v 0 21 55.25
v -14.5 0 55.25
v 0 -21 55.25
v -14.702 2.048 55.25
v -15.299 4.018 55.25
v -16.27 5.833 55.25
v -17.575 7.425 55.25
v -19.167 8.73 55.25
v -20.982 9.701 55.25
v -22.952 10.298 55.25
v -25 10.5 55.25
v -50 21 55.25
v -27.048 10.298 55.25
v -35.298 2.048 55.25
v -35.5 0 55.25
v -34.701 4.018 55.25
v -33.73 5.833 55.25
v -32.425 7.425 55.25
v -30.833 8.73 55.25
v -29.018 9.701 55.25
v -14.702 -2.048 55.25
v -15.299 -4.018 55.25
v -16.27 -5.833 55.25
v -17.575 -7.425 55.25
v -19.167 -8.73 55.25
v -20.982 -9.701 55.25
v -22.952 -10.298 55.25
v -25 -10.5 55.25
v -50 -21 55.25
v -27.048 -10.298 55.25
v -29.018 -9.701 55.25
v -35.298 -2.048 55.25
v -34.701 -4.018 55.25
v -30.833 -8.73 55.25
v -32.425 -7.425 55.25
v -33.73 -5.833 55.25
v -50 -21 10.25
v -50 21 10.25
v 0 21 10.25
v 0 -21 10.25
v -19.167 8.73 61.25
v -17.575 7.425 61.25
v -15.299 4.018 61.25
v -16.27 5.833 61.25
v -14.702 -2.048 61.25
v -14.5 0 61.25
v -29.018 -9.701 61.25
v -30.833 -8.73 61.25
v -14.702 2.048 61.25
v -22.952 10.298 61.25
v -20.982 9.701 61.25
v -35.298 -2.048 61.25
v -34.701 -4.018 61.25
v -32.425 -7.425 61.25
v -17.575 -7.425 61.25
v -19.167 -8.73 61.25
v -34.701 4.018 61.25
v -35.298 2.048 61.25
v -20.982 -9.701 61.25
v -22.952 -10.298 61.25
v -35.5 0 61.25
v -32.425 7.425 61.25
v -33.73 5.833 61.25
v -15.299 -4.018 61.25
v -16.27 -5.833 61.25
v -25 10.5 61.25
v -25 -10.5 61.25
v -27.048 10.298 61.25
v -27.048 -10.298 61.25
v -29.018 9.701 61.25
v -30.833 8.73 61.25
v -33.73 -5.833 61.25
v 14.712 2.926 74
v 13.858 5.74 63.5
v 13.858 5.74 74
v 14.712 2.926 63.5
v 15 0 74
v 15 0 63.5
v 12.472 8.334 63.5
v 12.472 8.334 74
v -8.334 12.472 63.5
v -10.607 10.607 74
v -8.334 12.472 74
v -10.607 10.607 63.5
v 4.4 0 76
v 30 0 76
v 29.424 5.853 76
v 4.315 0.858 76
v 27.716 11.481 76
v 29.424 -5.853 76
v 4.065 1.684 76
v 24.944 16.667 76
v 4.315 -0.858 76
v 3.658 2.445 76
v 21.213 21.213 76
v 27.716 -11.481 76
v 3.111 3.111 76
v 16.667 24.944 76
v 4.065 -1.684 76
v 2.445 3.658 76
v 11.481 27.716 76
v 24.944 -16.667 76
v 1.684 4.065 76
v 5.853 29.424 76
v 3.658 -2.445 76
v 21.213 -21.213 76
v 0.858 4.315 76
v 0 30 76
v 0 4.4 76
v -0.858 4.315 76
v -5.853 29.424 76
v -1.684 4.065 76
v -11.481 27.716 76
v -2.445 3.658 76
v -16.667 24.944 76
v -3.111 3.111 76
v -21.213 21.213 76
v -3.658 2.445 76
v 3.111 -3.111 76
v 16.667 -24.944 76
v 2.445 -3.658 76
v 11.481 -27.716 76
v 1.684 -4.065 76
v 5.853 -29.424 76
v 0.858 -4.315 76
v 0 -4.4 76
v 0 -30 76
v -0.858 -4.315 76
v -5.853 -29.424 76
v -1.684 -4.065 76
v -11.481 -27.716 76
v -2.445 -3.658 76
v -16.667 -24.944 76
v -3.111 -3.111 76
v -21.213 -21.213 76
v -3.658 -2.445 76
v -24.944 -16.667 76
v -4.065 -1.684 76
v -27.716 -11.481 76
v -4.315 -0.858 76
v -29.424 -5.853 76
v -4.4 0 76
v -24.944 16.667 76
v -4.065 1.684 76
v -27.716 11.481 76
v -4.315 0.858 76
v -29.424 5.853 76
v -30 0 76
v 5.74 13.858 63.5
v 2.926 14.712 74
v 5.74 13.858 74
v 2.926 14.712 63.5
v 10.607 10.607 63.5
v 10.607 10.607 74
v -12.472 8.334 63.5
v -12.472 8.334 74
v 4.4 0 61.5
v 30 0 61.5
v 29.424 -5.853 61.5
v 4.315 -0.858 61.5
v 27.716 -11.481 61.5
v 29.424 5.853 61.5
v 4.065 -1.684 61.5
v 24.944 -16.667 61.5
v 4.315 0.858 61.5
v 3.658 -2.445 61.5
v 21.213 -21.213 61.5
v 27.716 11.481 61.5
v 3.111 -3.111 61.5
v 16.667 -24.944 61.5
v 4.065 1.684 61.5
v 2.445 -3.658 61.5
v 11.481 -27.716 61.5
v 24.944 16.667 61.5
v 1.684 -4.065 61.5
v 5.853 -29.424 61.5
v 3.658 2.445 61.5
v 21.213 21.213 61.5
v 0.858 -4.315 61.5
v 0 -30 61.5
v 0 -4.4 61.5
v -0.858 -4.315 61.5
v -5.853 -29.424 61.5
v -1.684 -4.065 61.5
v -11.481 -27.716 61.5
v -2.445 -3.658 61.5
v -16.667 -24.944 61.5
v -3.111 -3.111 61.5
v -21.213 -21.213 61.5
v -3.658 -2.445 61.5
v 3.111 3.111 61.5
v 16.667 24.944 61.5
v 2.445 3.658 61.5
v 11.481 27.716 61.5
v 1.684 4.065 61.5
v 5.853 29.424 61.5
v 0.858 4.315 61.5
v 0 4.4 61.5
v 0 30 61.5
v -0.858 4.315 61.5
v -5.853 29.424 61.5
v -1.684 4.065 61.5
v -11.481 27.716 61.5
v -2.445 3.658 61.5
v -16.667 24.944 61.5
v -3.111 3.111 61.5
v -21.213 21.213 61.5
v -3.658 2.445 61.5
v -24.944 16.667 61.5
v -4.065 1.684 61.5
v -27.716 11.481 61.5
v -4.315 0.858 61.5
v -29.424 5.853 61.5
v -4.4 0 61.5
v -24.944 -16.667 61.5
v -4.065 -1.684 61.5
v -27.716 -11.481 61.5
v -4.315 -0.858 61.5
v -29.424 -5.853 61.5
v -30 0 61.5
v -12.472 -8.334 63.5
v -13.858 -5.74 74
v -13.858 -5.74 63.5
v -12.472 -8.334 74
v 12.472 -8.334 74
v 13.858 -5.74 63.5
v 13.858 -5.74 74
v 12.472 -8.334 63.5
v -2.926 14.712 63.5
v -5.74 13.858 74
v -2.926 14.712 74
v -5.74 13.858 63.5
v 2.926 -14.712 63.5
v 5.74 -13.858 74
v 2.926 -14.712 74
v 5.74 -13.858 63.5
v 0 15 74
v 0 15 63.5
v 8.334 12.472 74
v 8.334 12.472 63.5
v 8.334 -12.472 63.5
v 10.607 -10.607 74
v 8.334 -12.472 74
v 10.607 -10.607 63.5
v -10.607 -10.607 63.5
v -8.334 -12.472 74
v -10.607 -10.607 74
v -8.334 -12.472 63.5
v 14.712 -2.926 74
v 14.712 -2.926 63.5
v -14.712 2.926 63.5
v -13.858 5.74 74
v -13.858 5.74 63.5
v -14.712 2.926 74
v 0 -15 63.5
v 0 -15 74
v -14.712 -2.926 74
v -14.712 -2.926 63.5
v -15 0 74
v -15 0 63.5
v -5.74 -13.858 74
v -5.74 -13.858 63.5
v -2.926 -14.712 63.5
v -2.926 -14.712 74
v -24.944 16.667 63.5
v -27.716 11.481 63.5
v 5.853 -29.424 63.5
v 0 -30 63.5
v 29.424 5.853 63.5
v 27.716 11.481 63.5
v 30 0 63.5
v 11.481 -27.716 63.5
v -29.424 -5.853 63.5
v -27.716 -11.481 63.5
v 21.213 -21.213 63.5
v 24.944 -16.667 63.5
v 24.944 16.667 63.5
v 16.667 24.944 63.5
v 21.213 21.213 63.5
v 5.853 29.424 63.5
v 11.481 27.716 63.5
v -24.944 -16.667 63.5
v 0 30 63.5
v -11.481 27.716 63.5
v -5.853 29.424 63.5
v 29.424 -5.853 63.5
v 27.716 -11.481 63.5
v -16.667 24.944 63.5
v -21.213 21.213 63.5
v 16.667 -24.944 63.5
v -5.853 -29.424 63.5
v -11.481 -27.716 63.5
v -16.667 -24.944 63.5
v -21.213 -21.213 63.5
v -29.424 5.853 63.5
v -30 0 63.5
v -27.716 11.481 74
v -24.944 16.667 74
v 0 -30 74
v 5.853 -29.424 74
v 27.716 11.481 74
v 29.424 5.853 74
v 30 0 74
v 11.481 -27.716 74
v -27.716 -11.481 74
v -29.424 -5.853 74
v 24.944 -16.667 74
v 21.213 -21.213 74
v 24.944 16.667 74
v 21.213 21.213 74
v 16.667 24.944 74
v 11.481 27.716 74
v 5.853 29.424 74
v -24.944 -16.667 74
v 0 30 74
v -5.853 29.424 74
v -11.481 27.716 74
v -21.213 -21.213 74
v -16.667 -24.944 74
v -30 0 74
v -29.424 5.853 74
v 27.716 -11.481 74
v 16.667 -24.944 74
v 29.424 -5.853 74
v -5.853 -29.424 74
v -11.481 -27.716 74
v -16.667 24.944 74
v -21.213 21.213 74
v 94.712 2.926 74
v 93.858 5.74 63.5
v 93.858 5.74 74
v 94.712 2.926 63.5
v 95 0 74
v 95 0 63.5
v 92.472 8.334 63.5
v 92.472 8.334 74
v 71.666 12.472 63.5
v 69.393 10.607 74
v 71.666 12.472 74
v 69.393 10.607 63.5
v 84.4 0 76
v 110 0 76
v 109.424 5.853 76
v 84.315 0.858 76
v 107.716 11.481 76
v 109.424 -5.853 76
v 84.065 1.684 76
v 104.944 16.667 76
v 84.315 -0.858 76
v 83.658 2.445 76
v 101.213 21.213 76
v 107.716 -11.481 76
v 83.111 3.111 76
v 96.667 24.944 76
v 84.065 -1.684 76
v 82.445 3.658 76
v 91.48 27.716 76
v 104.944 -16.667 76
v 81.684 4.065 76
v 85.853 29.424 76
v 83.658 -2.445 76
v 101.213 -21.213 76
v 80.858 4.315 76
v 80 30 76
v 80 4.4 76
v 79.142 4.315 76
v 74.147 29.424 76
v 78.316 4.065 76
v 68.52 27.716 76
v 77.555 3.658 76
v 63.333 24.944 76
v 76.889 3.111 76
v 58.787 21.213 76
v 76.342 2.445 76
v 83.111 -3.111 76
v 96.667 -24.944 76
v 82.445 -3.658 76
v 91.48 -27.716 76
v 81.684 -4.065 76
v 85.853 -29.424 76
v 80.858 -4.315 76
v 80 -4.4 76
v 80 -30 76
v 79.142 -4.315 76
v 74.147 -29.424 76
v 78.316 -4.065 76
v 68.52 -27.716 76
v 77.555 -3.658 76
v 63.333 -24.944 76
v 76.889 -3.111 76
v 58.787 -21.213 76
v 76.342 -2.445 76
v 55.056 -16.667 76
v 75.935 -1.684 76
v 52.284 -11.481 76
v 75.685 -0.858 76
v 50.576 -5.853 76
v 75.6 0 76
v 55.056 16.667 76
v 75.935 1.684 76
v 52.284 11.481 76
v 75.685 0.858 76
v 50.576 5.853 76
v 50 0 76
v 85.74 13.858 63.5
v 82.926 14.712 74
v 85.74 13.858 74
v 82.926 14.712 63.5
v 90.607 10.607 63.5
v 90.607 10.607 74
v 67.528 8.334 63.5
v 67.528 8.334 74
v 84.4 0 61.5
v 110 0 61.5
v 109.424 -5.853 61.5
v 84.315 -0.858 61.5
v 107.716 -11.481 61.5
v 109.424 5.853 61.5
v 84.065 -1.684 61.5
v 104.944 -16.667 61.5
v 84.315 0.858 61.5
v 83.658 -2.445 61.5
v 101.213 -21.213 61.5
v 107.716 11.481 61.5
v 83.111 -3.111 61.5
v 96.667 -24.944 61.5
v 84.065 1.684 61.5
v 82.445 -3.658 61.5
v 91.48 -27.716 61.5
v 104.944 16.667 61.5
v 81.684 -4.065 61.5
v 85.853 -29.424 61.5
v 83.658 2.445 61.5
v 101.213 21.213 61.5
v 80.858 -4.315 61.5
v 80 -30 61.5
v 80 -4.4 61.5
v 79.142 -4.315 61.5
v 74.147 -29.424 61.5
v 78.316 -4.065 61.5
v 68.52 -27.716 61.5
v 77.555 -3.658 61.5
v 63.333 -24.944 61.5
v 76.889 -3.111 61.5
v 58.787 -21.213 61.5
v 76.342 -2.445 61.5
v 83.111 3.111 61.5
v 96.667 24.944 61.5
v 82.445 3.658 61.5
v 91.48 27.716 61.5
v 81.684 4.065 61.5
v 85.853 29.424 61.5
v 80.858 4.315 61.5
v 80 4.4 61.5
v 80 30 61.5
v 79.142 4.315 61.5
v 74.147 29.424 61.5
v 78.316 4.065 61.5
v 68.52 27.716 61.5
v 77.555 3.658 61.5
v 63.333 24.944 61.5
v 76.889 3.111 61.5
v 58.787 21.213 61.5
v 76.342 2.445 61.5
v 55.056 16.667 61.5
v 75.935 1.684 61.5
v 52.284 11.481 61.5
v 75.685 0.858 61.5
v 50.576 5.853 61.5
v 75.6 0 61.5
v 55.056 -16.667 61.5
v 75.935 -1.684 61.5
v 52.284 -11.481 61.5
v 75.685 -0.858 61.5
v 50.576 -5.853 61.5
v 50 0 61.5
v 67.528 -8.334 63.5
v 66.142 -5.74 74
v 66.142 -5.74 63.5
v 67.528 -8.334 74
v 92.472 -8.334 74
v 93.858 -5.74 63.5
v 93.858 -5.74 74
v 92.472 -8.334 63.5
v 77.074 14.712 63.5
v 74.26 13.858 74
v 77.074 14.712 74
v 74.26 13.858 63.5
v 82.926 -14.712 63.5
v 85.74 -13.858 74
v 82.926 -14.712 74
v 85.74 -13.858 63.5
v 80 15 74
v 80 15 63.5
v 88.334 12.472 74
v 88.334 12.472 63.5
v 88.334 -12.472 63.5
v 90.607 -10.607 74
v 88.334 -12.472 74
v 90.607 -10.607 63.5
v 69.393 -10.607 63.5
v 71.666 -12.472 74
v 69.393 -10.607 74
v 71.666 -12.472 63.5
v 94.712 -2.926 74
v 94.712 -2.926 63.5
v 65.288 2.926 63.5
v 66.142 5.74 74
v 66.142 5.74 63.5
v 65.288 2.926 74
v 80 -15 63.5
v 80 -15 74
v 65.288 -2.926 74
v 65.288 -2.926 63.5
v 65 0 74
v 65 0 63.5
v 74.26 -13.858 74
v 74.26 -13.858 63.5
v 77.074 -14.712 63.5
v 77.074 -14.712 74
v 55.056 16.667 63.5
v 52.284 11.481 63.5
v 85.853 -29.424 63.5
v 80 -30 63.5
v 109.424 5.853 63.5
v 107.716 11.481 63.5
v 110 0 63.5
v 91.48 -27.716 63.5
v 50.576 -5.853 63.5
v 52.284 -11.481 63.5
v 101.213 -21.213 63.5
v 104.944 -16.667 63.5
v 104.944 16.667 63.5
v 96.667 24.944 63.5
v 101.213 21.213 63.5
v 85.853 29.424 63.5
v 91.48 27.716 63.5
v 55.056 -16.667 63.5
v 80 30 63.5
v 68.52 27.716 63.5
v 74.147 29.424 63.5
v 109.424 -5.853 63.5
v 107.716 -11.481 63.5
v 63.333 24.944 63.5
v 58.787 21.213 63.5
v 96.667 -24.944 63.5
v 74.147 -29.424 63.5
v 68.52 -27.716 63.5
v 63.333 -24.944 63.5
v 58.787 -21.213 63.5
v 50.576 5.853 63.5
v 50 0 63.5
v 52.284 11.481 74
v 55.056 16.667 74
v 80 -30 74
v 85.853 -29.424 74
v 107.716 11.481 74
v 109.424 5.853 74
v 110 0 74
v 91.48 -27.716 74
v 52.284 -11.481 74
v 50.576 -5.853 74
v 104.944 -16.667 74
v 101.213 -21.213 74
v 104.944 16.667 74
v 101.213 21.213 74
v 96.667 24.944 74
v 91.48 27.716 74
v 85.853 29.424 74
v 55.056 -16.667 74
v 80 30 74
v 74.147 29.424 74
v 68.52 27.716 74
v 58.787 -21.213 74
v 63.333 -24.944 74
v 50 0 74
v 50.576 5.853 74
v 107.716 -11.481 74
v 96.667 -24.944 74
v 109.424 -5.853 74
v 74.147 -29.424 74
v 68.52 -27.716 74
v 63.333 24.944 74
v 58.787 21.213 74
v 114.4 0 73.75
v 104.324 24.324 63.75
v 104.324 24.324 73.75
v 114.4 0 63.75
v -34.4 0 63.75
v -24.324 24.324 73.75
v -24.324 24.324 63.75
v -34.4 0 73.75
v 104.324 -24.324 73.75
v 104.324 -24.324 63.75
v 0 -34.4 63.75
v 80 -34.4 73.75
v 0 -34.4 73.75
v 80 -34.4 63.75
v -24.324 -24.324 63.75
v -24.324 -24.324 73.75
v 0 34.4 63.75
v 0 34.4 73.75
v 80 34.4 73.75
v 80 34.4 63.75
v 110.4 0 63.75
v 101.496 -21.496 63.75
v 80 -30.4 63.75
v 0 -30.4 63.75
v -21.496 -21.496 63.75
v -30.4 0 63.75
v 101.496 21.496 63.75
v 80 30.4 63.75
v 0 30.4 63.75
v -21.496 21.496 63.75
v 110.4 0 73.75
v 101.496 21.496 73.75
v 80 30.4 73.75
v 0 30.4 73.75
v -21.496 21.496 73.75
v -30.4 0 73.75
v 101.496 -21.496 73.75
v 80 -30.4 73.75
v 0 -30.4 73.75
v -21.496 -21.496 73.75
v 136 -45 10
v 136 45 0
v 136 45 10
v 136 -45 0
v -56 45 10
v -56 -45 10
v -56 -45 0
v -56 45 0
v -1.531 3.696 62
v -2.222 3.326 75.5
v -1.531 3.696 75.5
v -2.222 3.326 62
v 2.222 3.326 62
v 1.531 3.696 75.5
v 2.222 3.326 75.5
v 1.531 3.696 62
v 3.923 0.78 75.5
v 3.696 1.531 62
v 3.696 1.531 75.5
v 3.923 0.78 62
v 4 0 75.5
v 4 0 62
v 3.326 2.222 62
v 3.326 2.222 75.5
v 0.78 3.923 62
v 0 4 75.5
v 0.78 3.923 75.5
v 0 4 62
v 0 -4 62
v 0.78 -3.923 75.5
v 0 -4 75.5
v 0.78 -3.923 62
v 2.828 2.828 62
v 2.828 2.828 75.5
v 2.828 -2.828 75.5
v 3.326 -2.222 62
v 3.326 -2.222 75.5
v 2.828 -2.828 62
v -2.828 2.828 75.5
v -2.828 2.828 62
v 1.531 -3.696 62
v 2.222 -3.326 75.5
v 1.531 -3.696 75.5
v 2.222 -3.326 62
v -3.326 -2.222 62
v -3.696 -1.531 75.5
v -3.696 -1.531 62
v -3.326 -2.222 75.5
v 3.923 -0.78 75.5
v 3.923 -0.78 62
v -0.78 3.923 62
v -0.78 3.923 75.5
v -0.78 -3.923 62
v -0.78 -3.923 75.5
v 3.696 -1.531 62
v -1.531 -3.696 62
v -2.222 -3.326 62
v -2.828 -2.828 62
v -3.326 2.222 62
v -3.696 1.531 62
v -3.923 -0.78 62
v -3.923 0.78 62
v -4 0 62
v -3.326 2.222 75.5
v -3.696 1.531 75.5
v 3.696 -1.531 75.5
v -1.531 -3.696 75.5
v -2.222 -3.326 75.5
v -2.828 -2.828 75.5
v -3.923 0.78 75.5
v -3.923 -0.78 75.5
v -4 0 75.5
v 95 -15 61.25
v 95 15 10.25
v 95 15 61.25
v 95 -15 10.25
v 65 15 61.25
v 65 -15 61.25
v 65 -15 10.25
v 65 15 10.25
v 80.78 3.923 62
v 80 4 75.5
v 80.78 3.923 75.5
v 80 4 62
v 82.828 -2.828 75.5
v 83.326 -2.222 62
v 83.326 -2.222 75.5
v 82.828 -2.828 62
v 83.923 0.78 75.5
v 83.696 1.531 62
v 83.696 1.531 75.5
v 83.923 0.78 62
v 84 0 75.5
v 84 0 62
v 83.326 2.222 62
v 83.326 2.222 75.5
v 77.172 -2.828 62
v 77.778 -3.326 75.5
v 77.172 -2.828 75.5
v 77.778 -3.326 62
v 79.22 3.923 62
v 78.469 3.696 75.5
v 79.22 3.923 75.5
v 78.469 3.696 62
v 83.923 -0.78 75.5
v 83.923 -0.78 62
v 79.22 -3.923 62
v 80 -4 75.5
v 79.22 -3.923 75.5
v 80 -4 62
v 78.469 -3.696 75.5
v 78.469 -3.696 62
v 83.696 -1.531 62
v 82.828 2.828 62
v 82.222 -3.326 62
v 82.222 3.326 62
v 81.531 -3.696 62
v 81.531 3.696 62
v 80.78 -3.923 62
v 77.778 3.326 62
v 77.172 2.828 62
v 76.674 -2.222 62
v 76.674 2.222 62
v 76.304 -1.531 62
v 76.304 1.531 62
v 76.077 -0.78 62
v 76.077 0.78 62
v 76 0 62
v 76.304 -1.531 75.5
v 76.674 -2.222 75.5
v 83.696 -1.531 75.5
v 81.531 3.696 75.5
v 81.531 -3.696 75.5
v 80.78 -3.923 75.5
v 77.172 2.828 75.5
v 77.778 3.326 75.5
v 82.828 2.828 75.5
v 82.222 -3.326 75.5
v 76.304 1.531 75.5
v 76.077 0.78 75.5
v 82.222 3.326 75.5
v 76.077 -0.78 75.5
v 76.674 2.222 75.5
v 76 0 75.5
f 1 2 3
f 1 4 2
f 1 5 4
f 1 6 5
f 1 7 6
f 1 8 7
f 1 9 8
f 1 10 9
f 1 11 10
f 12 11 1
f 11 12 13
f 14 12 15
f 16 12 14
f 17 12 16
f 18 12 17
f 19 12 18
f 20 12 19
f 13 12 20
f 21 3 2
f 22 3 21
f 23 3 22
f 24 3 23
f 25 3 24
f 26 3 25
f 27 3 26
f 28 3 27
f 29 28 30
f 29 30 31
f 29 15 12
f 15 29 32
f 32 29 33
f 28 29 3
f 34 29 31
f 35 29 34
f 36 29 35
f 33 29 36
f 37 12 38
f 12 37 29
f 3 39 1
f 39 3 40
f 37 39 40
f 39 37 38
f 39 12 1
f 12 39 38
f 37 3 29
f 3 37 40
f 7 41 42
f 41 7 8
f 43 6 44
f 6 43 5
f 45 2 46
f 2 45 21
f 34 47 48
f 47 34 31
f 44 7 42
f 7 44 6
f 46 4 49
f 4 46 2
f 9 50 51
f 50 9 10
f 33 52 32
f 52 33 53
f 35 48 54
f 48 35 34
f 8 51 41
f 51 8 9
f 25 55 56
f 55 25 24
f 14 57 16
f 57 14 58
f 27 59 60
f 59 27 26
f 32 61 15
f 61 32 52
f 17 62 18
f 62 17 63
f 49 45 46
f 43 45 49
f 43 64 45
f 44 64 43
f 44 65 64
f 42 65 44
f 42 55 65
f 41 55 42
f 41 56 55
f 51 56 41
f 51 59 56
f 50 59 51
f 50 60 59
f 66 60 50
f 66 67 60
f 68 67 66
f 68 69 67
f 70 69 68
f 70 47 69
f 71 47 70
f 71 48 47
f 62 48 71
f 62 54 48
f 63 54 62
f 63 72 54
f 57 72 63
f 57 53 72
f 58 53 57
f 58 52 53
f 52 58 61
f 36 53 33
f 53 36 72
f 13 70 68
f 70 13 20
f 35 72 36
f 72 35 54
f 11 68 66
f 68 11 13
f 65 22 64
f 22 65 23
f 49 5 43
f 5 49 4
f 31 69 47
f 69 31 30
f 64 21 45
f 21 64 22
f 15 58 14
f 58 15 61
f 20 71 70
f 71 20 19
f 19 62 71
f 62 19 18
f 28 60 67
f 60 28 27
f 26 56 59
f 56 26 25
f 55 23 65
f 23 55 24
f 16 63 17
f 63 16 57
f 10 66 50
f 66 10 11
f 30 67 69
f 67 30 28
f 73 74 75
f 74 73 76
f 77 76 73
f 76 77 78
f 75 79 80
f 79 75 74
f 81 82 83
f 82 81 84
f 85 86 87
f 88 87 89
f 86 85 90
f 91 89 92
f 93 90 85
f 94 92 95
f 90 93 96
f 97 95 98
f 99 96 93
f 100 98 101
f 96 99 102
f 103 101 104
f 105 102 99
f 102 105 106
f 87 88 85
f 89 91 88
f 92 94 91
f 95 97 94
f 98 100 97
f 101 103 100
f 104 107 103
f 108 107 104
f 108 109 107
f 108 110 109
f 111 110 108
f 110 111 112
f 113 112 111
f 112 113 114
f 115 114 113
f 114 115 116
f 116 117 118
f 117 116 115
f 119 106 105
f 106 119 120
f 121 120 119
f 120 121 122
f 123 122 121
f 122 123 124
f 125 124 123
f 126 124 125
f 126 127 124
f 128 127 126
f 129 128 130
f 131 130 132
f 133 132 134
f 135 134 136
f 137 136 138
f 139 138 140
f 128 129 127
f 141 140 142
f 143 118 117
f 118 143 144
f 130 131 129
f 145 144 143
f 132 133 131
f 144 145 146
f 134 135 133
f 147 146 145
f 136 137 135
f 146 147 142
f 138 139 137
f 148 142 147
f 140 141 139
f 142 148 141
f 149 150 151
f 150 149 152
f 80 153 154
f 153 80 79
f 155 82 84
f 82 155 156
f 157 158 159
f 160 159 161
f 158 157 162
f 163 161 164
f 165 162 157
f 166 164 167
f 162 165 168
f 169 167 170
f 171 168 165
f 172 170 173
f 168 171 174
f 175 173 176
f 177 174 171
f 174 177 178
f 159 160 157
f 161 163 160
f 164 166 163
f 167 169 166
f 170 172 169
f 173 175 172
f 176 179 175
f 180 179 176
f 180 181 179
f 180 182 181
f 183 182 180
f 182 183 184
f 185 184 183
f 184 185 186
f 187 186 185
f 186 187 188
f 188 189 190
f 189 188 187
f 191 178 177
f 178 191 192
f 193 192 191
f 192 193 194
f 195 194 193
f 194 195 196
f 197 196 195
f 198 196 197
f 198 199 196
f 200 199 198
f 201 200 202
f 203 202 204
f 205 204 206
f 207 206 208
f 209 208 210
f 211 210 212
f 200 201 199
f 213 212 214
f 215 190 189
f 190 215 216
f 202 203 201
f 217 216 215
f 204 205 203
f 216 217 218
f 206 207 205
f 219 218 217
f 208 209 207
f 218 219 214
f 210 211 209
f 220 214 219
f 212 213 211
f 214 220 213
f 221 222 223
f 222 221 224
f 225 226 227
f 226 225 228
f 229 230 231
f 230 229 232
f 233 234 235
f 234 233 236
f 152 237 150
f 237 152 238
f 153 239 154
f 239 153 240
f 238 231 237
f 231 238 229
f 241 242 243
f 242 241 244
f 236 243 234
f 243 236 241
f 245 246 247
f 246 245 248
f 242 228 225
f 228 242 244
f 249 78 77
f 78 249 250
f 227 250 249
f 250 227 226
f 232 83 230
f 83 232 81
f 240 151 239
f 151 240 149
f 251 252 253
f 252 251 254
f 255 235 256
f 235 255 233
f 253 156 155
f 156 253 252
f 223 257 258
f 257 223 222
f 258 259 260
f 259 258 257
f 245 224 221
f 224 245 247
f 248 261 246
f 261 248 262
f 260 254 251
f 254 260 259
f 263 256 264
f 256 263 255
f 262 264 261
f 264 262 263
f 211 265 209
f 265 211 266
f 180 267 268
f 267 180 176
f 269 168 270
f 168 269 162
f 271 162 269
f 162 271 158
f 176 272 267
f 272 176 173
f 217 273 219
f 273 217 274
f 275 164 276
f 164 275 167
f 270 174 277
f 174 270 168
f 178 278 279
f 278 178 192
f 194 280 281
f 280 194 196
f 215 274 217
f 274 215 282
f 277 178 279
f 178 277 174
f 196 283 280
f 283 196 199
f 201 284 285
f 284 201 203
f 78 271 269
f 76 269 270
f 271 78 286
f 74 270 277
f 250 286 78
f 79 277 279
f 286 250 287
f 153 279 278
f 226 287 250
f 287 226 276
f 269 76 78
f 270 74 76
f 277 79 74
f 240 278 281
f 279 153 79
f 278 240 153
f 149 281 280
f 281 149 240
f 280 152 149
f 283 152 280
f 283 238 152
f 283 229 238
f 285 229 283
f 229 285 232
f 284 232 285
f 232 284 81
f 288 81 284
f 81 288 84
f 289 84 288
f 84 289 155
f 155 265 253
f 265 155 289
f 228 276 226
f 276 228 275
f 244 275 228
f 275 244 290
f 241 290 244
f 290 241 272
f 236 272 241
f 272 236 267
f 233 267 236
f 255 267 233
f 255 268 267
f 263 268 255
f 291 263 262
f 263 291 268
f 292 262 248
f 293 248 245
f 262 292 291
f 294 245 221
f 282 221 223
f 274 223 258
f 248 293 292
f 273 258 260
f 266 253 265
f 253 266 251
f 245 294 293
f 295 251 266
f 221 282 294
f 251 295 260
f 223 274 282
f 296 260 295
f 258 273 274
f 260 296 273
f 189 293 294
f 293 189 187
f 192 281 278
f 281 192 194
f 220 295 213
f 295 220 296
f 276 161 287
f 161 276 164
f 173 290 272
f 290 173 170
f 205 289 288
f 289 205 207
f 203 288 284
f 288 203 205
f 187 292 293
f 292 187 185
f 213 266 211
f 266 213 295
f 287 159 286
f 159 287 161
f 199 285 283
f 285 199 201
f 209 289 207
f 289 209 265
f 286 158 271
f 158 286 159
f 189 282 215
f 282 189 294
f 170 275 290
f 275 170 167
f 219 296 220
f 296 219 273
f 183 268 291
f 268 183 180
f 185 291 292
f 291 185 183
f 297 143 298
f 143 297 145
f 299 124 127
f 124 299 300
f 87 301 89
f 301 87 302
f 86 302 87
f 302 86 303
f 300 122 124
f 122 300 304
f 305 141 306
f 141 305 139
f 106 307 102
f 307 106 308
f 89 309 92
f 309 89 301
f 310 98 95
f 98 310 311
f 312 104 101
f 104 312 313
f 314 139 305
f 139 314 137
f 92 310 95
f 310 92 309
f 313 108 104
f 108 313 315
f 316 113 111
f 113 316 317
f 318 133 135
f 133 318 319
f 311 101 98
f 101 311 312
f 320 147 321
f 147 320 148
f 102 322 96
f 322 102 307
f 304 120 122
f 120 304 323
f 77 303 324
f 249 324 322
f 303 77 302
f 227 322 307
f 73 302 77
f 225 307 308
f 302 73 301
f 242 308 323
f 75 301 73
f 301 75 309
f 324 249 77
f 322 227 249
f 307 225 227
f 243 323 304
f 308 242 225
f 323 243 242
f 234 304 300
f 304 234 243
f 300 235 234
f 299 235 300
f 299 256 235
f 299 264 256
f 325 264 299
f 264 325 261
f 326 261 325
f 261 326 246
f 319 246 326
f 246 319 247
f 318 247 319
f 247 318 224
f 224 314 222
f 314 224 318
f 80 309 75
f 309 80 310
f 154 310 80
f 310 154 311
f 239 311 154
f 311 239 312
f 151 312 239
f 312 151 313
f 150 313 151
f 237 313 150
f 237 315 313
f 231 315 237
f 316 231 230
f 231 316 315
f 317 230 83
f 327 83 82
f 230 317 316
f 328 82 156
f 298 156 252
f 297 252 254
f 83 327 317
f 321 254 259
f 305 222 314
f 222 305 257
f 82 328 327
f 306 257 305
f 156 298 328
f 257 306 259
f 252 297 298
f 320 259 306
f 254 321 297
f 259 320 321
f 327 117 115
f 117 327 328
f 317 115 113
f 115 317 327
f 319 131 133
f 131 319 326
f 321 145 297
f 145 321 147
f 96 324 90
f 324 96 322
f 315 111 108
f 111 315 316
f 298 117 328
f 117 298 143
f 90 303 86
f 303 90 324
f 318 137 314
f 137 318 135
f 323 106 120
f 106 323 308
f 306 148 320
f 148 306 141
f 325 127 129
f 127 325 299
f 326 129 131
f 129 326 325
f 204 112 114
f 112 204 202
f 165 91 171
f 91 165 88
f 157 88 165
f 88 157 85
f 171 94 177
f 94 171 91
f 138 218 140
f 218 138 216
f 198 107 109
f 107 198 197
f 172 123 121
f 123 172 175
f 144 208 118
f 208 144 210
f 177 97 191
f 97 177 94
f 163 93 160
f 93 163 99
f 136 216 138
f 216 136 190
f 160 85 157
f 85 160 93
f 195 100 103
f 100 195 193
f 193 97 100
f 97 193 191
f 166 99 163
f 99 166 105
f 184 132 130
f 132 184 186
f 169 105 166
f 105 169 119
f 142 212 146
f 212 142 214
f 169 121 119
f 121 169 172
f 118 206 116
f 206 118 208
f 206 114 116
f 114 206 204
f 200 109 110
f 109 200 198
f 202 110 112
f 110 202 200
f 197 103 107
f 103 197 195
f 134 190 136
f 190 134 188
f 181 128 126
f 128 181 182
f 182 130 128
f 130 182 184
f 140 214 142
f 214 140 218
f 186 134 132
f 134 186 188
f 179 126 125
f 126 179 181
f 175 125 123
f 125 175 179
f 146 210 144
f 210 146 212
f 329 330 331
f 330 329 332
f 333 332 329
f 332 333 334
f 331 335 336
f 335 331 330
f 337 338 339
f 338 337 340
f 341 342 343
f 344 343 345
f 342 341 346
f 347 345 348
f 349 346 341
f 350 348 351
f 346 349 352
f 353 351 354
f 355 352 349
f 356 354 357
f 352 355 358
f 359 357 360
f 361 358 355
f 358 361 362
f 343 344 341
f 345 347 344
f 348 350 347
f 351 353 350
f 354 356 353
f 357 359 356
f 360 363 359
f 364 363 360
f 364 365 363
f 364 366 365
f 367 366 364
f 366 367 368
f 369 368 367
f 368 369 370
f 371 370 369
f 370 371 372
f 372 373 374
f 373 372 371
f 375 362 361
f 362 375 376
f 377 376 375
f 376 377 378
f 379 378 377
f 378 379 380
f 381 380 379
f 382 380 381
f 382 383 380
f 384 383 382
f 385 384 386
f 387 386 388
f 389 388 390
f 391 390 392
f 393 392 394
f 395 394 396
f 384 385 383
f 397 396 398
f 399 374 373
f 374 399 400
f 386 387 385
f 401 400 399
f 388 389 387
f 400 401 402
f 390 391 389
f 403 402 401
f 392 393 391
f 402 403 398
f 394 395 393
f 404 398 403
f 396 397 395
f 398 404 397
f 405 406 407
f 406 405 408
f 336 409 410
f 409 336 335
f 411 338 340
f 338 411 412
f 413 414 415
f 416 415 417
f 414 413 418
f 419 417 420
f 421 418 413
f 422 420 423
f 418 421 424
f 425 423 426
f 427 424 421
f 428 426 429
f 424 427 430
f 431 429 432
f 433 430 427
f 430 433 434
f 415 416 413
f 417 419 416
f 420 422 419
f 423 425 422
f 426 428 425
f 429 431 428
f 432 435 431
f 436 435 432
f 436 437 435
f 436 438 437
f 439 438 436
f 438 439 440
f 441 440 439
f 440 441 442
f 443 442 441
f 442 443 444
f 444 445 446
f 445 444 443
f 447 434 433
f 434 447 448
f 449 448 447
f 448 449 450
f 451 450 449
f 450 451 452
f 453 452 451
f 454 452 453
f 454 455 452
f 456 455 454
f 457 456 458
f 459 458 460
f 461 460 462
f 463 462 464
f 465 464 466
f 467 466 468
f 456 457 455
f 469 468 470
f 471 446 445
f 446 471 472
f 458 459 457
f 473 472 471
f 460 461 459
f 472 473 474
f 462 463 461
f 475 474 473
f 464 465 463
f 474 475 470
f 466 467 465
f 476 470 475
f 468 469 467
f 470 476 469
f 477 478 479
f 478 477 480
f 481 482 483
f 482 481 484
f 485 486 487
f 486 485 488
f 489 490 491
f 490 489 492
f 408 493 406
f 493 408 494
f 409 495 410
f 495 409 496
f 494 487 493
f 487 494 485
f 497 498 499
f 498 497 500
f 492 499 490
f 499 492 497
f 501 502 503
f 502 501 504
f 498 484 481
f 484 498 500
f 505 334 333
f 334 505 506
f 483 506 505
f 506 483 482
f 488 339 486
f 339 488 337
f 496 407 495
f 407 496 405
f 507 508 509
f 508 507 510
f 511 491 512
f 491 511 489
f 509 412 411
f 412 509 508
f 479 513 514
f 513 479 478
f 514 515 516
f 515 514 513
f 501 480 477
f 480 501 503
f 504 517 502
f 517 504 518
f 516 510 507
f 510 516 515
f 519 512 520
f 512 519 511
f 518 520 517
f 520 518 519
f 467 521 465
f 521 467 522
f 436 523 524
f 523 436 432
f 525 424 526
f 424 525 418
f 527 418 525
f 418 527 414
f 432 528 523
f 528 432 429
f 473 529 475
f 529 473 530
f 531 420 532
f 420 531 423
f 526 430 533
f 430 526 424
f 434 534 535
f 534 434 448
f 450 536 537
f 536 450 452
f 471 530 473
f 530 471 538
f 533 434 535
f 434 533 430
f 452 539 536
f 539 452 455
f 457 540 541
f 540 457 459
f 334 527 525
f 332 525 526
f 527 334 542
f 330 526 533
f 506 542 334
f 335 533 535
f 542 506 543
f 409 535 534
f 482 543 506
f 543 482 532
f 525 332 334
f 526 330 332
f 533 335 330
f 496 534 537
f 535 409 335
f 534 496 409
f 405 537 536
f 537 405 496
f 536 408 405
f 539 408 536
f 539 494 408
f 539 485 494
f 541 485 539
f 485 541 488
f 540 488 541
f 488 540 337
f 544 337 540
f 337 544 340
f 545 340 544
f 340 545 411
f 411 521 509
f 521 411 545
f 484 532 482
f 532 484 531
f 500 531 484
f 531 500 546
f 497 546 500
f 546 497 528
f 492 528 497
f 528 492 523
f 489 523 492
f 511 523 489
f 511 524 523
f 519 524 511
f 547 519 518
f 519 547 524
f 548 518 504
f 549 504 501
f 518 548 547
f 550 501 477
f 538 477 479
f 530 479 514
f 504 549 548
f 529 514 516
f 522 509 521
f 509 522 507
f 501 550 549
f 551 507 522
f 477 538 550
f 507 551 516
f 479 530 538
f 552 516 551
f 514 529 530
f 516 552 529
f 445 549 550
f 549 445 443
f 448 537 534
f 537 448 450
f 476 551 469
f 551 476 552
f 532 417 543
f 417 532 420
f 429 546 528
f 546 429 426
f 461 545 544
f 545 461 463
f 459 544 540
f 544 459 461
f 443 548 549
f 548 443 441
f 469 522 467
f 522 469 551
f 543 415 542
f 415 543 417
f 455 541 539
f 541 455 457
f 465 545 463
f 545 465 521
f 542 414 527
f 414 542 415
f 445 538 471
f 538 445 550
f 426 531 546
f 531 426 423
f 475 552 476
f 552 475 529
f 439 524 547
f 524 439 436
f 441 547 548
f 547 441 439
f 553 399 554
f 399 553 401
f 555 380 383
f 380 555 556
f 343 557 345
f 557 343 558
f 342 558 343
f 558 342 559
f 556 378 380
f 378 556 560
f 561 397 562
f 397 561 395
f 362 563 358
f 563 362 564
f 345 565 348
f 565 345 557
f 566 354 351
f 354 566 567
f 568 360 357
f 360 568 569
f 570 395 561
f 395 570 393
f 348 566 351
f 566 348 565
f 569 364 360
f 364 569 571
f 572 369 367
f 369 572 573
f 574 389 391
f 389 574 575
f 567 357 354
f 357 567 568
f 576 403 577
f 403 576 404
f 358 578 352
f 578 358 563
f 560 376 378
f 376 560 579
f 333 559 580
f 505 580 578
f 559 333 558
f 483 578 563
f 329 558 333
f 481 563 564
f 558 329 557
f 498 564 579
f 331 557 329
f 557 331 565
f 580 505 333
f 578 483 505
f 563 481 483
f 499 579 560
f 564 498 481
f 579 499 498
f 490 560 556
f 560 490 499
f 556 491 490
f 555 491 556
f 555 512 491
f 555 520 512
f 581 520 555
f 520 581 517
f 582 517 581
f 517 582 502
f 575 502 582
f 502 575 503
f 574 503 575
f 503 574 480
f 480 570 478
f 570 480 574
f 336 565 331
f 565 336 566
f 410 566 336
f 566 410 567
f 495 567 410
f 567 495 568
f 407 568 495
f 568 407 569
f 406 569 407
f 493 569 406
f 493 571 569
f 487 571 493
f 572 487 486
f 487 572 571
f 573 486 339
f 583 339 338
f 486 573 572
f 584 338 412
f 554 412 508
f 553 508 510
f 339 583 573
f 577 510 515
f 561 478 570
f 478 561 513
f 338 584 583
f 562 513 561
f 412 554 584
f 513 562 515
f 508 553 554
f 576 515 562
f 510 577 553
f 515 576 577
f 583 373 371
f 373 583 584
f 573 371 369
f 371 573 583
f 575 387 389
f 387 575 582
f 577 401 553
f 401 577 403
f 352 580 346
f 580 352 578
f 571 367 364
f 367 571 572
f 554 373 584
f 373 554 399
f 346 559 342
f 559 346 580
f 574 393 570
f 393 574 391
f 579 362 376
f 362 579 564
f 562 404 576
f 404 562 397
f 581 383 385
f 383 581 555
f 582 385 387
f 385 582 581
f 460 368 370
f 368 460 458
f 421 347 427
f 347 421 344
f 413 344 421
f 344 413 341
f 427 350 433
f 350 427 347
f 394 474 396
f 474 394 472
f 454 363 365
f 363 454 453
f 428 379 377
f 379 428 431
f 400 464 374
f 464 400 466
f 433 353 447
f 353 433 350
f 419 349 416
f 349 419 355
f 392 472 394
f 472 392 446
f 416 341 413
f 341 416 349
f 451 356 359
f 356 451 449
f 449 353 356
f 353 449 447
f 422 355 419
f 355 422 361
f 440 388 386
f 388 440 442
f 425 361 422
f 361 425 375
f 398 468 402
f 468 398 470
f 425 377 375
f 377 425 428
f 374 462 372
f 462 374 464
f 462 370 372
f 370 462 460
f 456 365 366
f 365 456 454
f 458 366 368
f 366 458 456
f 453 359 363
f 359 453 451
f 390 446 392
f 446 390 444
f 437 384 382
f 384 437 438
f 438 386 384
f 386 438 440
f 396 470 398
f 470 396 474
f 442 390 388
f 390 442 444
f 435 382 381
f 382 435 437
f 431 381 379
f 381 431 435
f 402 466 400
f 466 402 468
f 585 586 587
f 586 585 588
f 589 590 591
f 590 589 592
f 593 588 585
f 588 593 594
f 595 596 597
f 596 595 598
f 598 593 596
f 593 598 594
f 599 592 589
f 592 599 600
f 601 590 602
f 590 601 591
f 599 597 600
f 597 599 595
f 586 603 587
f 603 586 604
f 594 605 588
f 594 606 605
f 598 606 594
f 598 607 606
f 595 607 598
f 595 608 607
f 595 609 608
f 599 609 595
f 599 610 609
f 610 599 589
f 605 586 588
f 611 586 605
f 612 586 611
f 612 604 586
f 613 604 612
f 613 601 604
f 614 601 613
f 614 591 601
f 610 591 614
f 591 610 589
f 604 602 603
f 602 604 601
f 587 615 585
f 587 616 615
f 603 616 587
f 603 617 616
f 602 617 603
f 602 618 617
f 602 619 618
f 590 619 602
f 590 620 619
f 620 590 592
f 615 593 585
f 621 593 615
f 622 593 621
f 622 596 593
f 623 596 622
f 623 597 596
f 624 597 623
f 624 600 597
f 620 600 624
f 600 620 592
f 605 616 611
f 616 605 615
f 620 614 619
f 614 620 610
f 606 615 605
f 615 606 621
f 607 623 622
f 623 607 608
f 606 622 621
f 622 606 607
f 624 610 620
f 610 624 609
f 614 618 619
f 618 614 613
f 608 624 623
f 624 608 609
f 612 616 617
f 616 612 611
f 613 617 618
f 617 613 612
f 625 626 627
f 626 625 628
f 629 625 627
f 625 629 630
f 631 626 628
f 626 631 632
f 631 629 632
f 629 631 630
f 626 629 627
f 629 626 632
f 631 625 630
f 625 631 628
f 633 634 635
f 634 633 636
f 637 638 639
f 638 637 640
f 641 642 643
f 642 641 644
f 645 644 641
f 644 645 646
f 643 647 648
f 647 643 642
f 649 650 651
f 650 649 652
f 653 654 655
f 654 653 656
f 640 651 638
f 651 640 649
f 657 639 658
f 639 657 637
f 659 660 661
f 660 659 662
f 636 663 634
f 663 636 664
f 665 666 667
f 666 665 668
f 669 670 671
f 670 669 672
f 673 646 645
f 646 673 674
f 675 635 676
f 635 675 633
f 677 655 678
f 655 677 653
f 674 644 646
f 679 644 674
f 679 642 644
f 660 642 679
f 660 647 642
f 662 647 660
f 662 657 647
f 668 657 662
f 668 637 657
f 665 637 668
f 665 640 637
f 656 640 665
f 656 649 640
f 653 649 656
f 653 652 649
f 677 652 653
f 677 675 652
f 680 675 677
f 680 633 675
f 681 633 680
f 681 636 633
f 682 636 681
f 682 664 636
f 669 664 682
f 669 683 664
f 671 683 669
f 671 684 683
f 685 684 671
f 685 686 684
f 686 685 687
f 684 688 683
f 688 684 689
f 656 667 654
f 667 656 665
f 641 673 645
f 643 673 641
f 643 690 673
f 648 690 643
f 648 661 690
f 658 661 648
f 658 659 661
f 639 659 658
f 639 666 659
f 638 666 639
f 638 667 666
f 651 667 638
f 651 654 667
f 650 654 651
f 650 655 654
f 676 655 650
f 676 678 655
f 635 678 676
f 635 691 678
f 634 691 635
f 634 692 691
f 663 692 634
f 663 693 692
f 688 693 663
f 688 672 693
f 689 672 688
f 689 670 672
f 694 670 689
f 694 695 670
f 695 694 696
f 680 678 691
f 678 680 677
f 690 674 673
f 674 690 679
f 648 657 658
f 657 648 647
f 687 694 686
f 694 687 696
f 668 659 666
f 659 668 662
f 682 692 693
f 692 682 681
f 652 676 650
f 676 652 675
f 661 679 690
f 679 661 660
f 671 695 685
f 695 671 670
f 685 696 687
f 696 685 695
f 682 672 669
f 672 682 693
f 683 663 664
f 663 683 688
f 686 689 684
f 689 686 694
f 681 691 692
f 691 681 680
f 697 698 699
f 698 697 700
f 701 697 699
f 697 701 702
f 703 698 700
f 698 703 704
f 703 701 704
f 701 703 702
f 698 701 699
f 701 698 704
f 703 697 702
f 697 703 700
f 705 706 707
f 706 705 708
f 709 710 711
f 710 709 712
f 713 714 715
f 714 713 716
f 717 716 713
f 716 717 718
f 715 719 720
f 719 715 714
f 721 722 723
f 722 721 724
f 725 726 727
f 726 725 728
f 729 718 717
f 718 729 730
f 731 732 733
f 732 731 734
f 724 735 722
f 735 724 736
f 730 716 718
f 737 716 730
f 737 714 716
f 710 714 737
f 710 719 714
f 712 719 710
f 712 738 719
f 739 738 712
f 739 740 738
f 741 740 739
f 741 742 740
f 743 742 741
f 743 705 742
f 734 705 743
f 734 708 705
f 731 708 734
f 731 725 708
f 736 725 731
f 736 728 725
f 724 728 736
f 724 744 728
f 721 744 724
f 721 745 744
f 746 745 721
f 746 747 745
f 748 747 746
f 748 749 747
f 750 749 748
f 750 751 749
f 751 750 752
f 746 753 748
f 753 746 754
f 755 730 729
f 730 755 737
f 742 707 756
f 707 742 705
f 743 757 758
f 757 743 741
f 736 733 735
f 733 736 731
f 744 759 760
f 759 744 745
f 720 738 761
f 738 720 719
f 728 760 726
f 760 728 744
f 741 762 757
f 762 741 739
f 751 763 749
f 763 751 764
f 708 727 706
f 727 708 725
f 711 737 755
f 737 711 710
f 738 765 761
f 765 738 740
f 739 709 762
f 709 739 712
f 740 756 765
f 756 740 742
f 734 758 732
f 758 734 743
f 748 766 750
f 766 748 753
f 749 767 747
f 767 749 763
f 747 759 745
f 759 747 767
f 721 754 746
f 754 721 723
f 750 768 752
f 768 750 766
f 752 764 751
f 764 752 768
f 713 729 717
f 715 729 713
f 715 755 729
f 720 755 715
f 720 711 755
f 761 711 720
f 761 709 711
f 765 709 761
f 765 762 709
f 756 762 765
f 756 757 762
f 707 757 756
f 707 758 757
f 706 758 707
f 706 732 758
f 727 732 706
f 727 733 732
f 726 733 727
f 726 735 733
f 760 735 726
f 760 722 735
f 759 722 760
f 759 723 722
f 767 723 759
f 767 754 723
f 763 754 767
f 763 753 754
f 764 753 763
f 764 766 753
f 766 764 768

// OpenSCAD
$fn = 32;

// ------------------------------------------------------------------------
// Motor belt drive: span 80 mm, pulleys d60, belt 10 mm wide
// Every part is its own module, assembly() places every instance.
// ------------------------------------------------------------------------

// --- part 1 ---
module base_plate() {
  difference() {
    translate([-96, -45, 0]) cube([192, 90, 10]);
  }
}

// --- part 2 ---
module motor() {
  union() {
    translate([-22.5, -21, 0]) cube([45, 42, 50]);
    translate([25.5, 0, 25]) rotate([0, 90, 0]) cylinder(h = 6, d = 21, center = true);
  }
}

// --- part 3 ---
module drive_shaft() {
  translate([0, 0, -6.75]) cylinder(h = 13.5, d = 8);
}

// --- part 4 ---
module pulley_drive() {
  difference() {
    union() {
      cylinder(h = 14.5, d = 30);
      cylinder(h = 2, d = 60);
      translate([0, 0, 12.5]) cylinder(h = 2, d = 60);
    }
    translate([0, 0, -1]) cylinder(h = 16.5, d = 8.8);
  }
}

// --- part 5 ---
module idler_post() {
  translate([-15, -15, 0]) cube([30, 30, 51]);
}

// --- part 6 ---
module driven_shaft() {
  translate([0, 0, -6.75]) cylinder(h = 13.5, d = 8);
}

// --- part 7 ---
module pulley_driven() {
  difference() {
    union() {
      cylinder(h = 14.5, d = 30);
      cylinder(h = 2, d = 60);
      translate([0, 0, 12.5]) cylinder(h = 2, d = 60);
    }
    translate([0, 0, -1]) cylinder(h = 16.5, d = 8.8);
  }
}

// --- part 8 ---
module drive_belt() {
  difference() {
    linear_extrude(height = 10) polygon(points = concat([for (a = [90 : 45 : 270]) [34.4 * cos(a), 34.4 * sin(a)]], [for (a = [270 : 45 : 450]) [80 + 34.4 * cos(a), 34.4 * sin(a)]]));
    translate([0, 0, -1]) linear_extrude(height = 12) polygon(points = concat([for (a = [90 : 45 : 270]) [30.4 * cos(a), 30.4 * sin(a)]], [for (a = [270 : 45 : 450]) [80 + 30.4 * cos(a), 30.4 * sin(a)]]));
  }
}

// --- assembly ---
module assembly() {
  color([0.80, 0.24, 0.20]) translate([40, 0, 0]) rotate([0, 0, 0]) base_plate();
  color([0.20, 0.45, 0.75]) translate([0, 0, 32.75]) rotate([0, 270, 0]) motor();
  color([0.25, 0.62, 0.32]) translate([0, 0, 68.75]) rotate([0, 0, 0]) drive_shaft();
  color([0.92, 0.70, 0.18]) translate([0, 0, 61.5]) rotate([0, 0, 0]) pulley_drive();
  color([0.58, 0.35, 0.70]) translate([80, 0, 10.25]) rotate([0, 0, 0]) idler_post();
  color([0.16, 0.66, 0.66]) translate([80, 0, 68.75]) rotate([0, 0, 0]) driven_shaft();
  color([0.85, 0.48, 0.18]) translate([80, 0, 61.5]) rotate([0, 0, 0]) pulley_driven();
  color([0.55, 0.60, 0.65]) translate([0, 0, 63.75]) rotate([0, 0, 0]) drive_belt();
}

assembly();
